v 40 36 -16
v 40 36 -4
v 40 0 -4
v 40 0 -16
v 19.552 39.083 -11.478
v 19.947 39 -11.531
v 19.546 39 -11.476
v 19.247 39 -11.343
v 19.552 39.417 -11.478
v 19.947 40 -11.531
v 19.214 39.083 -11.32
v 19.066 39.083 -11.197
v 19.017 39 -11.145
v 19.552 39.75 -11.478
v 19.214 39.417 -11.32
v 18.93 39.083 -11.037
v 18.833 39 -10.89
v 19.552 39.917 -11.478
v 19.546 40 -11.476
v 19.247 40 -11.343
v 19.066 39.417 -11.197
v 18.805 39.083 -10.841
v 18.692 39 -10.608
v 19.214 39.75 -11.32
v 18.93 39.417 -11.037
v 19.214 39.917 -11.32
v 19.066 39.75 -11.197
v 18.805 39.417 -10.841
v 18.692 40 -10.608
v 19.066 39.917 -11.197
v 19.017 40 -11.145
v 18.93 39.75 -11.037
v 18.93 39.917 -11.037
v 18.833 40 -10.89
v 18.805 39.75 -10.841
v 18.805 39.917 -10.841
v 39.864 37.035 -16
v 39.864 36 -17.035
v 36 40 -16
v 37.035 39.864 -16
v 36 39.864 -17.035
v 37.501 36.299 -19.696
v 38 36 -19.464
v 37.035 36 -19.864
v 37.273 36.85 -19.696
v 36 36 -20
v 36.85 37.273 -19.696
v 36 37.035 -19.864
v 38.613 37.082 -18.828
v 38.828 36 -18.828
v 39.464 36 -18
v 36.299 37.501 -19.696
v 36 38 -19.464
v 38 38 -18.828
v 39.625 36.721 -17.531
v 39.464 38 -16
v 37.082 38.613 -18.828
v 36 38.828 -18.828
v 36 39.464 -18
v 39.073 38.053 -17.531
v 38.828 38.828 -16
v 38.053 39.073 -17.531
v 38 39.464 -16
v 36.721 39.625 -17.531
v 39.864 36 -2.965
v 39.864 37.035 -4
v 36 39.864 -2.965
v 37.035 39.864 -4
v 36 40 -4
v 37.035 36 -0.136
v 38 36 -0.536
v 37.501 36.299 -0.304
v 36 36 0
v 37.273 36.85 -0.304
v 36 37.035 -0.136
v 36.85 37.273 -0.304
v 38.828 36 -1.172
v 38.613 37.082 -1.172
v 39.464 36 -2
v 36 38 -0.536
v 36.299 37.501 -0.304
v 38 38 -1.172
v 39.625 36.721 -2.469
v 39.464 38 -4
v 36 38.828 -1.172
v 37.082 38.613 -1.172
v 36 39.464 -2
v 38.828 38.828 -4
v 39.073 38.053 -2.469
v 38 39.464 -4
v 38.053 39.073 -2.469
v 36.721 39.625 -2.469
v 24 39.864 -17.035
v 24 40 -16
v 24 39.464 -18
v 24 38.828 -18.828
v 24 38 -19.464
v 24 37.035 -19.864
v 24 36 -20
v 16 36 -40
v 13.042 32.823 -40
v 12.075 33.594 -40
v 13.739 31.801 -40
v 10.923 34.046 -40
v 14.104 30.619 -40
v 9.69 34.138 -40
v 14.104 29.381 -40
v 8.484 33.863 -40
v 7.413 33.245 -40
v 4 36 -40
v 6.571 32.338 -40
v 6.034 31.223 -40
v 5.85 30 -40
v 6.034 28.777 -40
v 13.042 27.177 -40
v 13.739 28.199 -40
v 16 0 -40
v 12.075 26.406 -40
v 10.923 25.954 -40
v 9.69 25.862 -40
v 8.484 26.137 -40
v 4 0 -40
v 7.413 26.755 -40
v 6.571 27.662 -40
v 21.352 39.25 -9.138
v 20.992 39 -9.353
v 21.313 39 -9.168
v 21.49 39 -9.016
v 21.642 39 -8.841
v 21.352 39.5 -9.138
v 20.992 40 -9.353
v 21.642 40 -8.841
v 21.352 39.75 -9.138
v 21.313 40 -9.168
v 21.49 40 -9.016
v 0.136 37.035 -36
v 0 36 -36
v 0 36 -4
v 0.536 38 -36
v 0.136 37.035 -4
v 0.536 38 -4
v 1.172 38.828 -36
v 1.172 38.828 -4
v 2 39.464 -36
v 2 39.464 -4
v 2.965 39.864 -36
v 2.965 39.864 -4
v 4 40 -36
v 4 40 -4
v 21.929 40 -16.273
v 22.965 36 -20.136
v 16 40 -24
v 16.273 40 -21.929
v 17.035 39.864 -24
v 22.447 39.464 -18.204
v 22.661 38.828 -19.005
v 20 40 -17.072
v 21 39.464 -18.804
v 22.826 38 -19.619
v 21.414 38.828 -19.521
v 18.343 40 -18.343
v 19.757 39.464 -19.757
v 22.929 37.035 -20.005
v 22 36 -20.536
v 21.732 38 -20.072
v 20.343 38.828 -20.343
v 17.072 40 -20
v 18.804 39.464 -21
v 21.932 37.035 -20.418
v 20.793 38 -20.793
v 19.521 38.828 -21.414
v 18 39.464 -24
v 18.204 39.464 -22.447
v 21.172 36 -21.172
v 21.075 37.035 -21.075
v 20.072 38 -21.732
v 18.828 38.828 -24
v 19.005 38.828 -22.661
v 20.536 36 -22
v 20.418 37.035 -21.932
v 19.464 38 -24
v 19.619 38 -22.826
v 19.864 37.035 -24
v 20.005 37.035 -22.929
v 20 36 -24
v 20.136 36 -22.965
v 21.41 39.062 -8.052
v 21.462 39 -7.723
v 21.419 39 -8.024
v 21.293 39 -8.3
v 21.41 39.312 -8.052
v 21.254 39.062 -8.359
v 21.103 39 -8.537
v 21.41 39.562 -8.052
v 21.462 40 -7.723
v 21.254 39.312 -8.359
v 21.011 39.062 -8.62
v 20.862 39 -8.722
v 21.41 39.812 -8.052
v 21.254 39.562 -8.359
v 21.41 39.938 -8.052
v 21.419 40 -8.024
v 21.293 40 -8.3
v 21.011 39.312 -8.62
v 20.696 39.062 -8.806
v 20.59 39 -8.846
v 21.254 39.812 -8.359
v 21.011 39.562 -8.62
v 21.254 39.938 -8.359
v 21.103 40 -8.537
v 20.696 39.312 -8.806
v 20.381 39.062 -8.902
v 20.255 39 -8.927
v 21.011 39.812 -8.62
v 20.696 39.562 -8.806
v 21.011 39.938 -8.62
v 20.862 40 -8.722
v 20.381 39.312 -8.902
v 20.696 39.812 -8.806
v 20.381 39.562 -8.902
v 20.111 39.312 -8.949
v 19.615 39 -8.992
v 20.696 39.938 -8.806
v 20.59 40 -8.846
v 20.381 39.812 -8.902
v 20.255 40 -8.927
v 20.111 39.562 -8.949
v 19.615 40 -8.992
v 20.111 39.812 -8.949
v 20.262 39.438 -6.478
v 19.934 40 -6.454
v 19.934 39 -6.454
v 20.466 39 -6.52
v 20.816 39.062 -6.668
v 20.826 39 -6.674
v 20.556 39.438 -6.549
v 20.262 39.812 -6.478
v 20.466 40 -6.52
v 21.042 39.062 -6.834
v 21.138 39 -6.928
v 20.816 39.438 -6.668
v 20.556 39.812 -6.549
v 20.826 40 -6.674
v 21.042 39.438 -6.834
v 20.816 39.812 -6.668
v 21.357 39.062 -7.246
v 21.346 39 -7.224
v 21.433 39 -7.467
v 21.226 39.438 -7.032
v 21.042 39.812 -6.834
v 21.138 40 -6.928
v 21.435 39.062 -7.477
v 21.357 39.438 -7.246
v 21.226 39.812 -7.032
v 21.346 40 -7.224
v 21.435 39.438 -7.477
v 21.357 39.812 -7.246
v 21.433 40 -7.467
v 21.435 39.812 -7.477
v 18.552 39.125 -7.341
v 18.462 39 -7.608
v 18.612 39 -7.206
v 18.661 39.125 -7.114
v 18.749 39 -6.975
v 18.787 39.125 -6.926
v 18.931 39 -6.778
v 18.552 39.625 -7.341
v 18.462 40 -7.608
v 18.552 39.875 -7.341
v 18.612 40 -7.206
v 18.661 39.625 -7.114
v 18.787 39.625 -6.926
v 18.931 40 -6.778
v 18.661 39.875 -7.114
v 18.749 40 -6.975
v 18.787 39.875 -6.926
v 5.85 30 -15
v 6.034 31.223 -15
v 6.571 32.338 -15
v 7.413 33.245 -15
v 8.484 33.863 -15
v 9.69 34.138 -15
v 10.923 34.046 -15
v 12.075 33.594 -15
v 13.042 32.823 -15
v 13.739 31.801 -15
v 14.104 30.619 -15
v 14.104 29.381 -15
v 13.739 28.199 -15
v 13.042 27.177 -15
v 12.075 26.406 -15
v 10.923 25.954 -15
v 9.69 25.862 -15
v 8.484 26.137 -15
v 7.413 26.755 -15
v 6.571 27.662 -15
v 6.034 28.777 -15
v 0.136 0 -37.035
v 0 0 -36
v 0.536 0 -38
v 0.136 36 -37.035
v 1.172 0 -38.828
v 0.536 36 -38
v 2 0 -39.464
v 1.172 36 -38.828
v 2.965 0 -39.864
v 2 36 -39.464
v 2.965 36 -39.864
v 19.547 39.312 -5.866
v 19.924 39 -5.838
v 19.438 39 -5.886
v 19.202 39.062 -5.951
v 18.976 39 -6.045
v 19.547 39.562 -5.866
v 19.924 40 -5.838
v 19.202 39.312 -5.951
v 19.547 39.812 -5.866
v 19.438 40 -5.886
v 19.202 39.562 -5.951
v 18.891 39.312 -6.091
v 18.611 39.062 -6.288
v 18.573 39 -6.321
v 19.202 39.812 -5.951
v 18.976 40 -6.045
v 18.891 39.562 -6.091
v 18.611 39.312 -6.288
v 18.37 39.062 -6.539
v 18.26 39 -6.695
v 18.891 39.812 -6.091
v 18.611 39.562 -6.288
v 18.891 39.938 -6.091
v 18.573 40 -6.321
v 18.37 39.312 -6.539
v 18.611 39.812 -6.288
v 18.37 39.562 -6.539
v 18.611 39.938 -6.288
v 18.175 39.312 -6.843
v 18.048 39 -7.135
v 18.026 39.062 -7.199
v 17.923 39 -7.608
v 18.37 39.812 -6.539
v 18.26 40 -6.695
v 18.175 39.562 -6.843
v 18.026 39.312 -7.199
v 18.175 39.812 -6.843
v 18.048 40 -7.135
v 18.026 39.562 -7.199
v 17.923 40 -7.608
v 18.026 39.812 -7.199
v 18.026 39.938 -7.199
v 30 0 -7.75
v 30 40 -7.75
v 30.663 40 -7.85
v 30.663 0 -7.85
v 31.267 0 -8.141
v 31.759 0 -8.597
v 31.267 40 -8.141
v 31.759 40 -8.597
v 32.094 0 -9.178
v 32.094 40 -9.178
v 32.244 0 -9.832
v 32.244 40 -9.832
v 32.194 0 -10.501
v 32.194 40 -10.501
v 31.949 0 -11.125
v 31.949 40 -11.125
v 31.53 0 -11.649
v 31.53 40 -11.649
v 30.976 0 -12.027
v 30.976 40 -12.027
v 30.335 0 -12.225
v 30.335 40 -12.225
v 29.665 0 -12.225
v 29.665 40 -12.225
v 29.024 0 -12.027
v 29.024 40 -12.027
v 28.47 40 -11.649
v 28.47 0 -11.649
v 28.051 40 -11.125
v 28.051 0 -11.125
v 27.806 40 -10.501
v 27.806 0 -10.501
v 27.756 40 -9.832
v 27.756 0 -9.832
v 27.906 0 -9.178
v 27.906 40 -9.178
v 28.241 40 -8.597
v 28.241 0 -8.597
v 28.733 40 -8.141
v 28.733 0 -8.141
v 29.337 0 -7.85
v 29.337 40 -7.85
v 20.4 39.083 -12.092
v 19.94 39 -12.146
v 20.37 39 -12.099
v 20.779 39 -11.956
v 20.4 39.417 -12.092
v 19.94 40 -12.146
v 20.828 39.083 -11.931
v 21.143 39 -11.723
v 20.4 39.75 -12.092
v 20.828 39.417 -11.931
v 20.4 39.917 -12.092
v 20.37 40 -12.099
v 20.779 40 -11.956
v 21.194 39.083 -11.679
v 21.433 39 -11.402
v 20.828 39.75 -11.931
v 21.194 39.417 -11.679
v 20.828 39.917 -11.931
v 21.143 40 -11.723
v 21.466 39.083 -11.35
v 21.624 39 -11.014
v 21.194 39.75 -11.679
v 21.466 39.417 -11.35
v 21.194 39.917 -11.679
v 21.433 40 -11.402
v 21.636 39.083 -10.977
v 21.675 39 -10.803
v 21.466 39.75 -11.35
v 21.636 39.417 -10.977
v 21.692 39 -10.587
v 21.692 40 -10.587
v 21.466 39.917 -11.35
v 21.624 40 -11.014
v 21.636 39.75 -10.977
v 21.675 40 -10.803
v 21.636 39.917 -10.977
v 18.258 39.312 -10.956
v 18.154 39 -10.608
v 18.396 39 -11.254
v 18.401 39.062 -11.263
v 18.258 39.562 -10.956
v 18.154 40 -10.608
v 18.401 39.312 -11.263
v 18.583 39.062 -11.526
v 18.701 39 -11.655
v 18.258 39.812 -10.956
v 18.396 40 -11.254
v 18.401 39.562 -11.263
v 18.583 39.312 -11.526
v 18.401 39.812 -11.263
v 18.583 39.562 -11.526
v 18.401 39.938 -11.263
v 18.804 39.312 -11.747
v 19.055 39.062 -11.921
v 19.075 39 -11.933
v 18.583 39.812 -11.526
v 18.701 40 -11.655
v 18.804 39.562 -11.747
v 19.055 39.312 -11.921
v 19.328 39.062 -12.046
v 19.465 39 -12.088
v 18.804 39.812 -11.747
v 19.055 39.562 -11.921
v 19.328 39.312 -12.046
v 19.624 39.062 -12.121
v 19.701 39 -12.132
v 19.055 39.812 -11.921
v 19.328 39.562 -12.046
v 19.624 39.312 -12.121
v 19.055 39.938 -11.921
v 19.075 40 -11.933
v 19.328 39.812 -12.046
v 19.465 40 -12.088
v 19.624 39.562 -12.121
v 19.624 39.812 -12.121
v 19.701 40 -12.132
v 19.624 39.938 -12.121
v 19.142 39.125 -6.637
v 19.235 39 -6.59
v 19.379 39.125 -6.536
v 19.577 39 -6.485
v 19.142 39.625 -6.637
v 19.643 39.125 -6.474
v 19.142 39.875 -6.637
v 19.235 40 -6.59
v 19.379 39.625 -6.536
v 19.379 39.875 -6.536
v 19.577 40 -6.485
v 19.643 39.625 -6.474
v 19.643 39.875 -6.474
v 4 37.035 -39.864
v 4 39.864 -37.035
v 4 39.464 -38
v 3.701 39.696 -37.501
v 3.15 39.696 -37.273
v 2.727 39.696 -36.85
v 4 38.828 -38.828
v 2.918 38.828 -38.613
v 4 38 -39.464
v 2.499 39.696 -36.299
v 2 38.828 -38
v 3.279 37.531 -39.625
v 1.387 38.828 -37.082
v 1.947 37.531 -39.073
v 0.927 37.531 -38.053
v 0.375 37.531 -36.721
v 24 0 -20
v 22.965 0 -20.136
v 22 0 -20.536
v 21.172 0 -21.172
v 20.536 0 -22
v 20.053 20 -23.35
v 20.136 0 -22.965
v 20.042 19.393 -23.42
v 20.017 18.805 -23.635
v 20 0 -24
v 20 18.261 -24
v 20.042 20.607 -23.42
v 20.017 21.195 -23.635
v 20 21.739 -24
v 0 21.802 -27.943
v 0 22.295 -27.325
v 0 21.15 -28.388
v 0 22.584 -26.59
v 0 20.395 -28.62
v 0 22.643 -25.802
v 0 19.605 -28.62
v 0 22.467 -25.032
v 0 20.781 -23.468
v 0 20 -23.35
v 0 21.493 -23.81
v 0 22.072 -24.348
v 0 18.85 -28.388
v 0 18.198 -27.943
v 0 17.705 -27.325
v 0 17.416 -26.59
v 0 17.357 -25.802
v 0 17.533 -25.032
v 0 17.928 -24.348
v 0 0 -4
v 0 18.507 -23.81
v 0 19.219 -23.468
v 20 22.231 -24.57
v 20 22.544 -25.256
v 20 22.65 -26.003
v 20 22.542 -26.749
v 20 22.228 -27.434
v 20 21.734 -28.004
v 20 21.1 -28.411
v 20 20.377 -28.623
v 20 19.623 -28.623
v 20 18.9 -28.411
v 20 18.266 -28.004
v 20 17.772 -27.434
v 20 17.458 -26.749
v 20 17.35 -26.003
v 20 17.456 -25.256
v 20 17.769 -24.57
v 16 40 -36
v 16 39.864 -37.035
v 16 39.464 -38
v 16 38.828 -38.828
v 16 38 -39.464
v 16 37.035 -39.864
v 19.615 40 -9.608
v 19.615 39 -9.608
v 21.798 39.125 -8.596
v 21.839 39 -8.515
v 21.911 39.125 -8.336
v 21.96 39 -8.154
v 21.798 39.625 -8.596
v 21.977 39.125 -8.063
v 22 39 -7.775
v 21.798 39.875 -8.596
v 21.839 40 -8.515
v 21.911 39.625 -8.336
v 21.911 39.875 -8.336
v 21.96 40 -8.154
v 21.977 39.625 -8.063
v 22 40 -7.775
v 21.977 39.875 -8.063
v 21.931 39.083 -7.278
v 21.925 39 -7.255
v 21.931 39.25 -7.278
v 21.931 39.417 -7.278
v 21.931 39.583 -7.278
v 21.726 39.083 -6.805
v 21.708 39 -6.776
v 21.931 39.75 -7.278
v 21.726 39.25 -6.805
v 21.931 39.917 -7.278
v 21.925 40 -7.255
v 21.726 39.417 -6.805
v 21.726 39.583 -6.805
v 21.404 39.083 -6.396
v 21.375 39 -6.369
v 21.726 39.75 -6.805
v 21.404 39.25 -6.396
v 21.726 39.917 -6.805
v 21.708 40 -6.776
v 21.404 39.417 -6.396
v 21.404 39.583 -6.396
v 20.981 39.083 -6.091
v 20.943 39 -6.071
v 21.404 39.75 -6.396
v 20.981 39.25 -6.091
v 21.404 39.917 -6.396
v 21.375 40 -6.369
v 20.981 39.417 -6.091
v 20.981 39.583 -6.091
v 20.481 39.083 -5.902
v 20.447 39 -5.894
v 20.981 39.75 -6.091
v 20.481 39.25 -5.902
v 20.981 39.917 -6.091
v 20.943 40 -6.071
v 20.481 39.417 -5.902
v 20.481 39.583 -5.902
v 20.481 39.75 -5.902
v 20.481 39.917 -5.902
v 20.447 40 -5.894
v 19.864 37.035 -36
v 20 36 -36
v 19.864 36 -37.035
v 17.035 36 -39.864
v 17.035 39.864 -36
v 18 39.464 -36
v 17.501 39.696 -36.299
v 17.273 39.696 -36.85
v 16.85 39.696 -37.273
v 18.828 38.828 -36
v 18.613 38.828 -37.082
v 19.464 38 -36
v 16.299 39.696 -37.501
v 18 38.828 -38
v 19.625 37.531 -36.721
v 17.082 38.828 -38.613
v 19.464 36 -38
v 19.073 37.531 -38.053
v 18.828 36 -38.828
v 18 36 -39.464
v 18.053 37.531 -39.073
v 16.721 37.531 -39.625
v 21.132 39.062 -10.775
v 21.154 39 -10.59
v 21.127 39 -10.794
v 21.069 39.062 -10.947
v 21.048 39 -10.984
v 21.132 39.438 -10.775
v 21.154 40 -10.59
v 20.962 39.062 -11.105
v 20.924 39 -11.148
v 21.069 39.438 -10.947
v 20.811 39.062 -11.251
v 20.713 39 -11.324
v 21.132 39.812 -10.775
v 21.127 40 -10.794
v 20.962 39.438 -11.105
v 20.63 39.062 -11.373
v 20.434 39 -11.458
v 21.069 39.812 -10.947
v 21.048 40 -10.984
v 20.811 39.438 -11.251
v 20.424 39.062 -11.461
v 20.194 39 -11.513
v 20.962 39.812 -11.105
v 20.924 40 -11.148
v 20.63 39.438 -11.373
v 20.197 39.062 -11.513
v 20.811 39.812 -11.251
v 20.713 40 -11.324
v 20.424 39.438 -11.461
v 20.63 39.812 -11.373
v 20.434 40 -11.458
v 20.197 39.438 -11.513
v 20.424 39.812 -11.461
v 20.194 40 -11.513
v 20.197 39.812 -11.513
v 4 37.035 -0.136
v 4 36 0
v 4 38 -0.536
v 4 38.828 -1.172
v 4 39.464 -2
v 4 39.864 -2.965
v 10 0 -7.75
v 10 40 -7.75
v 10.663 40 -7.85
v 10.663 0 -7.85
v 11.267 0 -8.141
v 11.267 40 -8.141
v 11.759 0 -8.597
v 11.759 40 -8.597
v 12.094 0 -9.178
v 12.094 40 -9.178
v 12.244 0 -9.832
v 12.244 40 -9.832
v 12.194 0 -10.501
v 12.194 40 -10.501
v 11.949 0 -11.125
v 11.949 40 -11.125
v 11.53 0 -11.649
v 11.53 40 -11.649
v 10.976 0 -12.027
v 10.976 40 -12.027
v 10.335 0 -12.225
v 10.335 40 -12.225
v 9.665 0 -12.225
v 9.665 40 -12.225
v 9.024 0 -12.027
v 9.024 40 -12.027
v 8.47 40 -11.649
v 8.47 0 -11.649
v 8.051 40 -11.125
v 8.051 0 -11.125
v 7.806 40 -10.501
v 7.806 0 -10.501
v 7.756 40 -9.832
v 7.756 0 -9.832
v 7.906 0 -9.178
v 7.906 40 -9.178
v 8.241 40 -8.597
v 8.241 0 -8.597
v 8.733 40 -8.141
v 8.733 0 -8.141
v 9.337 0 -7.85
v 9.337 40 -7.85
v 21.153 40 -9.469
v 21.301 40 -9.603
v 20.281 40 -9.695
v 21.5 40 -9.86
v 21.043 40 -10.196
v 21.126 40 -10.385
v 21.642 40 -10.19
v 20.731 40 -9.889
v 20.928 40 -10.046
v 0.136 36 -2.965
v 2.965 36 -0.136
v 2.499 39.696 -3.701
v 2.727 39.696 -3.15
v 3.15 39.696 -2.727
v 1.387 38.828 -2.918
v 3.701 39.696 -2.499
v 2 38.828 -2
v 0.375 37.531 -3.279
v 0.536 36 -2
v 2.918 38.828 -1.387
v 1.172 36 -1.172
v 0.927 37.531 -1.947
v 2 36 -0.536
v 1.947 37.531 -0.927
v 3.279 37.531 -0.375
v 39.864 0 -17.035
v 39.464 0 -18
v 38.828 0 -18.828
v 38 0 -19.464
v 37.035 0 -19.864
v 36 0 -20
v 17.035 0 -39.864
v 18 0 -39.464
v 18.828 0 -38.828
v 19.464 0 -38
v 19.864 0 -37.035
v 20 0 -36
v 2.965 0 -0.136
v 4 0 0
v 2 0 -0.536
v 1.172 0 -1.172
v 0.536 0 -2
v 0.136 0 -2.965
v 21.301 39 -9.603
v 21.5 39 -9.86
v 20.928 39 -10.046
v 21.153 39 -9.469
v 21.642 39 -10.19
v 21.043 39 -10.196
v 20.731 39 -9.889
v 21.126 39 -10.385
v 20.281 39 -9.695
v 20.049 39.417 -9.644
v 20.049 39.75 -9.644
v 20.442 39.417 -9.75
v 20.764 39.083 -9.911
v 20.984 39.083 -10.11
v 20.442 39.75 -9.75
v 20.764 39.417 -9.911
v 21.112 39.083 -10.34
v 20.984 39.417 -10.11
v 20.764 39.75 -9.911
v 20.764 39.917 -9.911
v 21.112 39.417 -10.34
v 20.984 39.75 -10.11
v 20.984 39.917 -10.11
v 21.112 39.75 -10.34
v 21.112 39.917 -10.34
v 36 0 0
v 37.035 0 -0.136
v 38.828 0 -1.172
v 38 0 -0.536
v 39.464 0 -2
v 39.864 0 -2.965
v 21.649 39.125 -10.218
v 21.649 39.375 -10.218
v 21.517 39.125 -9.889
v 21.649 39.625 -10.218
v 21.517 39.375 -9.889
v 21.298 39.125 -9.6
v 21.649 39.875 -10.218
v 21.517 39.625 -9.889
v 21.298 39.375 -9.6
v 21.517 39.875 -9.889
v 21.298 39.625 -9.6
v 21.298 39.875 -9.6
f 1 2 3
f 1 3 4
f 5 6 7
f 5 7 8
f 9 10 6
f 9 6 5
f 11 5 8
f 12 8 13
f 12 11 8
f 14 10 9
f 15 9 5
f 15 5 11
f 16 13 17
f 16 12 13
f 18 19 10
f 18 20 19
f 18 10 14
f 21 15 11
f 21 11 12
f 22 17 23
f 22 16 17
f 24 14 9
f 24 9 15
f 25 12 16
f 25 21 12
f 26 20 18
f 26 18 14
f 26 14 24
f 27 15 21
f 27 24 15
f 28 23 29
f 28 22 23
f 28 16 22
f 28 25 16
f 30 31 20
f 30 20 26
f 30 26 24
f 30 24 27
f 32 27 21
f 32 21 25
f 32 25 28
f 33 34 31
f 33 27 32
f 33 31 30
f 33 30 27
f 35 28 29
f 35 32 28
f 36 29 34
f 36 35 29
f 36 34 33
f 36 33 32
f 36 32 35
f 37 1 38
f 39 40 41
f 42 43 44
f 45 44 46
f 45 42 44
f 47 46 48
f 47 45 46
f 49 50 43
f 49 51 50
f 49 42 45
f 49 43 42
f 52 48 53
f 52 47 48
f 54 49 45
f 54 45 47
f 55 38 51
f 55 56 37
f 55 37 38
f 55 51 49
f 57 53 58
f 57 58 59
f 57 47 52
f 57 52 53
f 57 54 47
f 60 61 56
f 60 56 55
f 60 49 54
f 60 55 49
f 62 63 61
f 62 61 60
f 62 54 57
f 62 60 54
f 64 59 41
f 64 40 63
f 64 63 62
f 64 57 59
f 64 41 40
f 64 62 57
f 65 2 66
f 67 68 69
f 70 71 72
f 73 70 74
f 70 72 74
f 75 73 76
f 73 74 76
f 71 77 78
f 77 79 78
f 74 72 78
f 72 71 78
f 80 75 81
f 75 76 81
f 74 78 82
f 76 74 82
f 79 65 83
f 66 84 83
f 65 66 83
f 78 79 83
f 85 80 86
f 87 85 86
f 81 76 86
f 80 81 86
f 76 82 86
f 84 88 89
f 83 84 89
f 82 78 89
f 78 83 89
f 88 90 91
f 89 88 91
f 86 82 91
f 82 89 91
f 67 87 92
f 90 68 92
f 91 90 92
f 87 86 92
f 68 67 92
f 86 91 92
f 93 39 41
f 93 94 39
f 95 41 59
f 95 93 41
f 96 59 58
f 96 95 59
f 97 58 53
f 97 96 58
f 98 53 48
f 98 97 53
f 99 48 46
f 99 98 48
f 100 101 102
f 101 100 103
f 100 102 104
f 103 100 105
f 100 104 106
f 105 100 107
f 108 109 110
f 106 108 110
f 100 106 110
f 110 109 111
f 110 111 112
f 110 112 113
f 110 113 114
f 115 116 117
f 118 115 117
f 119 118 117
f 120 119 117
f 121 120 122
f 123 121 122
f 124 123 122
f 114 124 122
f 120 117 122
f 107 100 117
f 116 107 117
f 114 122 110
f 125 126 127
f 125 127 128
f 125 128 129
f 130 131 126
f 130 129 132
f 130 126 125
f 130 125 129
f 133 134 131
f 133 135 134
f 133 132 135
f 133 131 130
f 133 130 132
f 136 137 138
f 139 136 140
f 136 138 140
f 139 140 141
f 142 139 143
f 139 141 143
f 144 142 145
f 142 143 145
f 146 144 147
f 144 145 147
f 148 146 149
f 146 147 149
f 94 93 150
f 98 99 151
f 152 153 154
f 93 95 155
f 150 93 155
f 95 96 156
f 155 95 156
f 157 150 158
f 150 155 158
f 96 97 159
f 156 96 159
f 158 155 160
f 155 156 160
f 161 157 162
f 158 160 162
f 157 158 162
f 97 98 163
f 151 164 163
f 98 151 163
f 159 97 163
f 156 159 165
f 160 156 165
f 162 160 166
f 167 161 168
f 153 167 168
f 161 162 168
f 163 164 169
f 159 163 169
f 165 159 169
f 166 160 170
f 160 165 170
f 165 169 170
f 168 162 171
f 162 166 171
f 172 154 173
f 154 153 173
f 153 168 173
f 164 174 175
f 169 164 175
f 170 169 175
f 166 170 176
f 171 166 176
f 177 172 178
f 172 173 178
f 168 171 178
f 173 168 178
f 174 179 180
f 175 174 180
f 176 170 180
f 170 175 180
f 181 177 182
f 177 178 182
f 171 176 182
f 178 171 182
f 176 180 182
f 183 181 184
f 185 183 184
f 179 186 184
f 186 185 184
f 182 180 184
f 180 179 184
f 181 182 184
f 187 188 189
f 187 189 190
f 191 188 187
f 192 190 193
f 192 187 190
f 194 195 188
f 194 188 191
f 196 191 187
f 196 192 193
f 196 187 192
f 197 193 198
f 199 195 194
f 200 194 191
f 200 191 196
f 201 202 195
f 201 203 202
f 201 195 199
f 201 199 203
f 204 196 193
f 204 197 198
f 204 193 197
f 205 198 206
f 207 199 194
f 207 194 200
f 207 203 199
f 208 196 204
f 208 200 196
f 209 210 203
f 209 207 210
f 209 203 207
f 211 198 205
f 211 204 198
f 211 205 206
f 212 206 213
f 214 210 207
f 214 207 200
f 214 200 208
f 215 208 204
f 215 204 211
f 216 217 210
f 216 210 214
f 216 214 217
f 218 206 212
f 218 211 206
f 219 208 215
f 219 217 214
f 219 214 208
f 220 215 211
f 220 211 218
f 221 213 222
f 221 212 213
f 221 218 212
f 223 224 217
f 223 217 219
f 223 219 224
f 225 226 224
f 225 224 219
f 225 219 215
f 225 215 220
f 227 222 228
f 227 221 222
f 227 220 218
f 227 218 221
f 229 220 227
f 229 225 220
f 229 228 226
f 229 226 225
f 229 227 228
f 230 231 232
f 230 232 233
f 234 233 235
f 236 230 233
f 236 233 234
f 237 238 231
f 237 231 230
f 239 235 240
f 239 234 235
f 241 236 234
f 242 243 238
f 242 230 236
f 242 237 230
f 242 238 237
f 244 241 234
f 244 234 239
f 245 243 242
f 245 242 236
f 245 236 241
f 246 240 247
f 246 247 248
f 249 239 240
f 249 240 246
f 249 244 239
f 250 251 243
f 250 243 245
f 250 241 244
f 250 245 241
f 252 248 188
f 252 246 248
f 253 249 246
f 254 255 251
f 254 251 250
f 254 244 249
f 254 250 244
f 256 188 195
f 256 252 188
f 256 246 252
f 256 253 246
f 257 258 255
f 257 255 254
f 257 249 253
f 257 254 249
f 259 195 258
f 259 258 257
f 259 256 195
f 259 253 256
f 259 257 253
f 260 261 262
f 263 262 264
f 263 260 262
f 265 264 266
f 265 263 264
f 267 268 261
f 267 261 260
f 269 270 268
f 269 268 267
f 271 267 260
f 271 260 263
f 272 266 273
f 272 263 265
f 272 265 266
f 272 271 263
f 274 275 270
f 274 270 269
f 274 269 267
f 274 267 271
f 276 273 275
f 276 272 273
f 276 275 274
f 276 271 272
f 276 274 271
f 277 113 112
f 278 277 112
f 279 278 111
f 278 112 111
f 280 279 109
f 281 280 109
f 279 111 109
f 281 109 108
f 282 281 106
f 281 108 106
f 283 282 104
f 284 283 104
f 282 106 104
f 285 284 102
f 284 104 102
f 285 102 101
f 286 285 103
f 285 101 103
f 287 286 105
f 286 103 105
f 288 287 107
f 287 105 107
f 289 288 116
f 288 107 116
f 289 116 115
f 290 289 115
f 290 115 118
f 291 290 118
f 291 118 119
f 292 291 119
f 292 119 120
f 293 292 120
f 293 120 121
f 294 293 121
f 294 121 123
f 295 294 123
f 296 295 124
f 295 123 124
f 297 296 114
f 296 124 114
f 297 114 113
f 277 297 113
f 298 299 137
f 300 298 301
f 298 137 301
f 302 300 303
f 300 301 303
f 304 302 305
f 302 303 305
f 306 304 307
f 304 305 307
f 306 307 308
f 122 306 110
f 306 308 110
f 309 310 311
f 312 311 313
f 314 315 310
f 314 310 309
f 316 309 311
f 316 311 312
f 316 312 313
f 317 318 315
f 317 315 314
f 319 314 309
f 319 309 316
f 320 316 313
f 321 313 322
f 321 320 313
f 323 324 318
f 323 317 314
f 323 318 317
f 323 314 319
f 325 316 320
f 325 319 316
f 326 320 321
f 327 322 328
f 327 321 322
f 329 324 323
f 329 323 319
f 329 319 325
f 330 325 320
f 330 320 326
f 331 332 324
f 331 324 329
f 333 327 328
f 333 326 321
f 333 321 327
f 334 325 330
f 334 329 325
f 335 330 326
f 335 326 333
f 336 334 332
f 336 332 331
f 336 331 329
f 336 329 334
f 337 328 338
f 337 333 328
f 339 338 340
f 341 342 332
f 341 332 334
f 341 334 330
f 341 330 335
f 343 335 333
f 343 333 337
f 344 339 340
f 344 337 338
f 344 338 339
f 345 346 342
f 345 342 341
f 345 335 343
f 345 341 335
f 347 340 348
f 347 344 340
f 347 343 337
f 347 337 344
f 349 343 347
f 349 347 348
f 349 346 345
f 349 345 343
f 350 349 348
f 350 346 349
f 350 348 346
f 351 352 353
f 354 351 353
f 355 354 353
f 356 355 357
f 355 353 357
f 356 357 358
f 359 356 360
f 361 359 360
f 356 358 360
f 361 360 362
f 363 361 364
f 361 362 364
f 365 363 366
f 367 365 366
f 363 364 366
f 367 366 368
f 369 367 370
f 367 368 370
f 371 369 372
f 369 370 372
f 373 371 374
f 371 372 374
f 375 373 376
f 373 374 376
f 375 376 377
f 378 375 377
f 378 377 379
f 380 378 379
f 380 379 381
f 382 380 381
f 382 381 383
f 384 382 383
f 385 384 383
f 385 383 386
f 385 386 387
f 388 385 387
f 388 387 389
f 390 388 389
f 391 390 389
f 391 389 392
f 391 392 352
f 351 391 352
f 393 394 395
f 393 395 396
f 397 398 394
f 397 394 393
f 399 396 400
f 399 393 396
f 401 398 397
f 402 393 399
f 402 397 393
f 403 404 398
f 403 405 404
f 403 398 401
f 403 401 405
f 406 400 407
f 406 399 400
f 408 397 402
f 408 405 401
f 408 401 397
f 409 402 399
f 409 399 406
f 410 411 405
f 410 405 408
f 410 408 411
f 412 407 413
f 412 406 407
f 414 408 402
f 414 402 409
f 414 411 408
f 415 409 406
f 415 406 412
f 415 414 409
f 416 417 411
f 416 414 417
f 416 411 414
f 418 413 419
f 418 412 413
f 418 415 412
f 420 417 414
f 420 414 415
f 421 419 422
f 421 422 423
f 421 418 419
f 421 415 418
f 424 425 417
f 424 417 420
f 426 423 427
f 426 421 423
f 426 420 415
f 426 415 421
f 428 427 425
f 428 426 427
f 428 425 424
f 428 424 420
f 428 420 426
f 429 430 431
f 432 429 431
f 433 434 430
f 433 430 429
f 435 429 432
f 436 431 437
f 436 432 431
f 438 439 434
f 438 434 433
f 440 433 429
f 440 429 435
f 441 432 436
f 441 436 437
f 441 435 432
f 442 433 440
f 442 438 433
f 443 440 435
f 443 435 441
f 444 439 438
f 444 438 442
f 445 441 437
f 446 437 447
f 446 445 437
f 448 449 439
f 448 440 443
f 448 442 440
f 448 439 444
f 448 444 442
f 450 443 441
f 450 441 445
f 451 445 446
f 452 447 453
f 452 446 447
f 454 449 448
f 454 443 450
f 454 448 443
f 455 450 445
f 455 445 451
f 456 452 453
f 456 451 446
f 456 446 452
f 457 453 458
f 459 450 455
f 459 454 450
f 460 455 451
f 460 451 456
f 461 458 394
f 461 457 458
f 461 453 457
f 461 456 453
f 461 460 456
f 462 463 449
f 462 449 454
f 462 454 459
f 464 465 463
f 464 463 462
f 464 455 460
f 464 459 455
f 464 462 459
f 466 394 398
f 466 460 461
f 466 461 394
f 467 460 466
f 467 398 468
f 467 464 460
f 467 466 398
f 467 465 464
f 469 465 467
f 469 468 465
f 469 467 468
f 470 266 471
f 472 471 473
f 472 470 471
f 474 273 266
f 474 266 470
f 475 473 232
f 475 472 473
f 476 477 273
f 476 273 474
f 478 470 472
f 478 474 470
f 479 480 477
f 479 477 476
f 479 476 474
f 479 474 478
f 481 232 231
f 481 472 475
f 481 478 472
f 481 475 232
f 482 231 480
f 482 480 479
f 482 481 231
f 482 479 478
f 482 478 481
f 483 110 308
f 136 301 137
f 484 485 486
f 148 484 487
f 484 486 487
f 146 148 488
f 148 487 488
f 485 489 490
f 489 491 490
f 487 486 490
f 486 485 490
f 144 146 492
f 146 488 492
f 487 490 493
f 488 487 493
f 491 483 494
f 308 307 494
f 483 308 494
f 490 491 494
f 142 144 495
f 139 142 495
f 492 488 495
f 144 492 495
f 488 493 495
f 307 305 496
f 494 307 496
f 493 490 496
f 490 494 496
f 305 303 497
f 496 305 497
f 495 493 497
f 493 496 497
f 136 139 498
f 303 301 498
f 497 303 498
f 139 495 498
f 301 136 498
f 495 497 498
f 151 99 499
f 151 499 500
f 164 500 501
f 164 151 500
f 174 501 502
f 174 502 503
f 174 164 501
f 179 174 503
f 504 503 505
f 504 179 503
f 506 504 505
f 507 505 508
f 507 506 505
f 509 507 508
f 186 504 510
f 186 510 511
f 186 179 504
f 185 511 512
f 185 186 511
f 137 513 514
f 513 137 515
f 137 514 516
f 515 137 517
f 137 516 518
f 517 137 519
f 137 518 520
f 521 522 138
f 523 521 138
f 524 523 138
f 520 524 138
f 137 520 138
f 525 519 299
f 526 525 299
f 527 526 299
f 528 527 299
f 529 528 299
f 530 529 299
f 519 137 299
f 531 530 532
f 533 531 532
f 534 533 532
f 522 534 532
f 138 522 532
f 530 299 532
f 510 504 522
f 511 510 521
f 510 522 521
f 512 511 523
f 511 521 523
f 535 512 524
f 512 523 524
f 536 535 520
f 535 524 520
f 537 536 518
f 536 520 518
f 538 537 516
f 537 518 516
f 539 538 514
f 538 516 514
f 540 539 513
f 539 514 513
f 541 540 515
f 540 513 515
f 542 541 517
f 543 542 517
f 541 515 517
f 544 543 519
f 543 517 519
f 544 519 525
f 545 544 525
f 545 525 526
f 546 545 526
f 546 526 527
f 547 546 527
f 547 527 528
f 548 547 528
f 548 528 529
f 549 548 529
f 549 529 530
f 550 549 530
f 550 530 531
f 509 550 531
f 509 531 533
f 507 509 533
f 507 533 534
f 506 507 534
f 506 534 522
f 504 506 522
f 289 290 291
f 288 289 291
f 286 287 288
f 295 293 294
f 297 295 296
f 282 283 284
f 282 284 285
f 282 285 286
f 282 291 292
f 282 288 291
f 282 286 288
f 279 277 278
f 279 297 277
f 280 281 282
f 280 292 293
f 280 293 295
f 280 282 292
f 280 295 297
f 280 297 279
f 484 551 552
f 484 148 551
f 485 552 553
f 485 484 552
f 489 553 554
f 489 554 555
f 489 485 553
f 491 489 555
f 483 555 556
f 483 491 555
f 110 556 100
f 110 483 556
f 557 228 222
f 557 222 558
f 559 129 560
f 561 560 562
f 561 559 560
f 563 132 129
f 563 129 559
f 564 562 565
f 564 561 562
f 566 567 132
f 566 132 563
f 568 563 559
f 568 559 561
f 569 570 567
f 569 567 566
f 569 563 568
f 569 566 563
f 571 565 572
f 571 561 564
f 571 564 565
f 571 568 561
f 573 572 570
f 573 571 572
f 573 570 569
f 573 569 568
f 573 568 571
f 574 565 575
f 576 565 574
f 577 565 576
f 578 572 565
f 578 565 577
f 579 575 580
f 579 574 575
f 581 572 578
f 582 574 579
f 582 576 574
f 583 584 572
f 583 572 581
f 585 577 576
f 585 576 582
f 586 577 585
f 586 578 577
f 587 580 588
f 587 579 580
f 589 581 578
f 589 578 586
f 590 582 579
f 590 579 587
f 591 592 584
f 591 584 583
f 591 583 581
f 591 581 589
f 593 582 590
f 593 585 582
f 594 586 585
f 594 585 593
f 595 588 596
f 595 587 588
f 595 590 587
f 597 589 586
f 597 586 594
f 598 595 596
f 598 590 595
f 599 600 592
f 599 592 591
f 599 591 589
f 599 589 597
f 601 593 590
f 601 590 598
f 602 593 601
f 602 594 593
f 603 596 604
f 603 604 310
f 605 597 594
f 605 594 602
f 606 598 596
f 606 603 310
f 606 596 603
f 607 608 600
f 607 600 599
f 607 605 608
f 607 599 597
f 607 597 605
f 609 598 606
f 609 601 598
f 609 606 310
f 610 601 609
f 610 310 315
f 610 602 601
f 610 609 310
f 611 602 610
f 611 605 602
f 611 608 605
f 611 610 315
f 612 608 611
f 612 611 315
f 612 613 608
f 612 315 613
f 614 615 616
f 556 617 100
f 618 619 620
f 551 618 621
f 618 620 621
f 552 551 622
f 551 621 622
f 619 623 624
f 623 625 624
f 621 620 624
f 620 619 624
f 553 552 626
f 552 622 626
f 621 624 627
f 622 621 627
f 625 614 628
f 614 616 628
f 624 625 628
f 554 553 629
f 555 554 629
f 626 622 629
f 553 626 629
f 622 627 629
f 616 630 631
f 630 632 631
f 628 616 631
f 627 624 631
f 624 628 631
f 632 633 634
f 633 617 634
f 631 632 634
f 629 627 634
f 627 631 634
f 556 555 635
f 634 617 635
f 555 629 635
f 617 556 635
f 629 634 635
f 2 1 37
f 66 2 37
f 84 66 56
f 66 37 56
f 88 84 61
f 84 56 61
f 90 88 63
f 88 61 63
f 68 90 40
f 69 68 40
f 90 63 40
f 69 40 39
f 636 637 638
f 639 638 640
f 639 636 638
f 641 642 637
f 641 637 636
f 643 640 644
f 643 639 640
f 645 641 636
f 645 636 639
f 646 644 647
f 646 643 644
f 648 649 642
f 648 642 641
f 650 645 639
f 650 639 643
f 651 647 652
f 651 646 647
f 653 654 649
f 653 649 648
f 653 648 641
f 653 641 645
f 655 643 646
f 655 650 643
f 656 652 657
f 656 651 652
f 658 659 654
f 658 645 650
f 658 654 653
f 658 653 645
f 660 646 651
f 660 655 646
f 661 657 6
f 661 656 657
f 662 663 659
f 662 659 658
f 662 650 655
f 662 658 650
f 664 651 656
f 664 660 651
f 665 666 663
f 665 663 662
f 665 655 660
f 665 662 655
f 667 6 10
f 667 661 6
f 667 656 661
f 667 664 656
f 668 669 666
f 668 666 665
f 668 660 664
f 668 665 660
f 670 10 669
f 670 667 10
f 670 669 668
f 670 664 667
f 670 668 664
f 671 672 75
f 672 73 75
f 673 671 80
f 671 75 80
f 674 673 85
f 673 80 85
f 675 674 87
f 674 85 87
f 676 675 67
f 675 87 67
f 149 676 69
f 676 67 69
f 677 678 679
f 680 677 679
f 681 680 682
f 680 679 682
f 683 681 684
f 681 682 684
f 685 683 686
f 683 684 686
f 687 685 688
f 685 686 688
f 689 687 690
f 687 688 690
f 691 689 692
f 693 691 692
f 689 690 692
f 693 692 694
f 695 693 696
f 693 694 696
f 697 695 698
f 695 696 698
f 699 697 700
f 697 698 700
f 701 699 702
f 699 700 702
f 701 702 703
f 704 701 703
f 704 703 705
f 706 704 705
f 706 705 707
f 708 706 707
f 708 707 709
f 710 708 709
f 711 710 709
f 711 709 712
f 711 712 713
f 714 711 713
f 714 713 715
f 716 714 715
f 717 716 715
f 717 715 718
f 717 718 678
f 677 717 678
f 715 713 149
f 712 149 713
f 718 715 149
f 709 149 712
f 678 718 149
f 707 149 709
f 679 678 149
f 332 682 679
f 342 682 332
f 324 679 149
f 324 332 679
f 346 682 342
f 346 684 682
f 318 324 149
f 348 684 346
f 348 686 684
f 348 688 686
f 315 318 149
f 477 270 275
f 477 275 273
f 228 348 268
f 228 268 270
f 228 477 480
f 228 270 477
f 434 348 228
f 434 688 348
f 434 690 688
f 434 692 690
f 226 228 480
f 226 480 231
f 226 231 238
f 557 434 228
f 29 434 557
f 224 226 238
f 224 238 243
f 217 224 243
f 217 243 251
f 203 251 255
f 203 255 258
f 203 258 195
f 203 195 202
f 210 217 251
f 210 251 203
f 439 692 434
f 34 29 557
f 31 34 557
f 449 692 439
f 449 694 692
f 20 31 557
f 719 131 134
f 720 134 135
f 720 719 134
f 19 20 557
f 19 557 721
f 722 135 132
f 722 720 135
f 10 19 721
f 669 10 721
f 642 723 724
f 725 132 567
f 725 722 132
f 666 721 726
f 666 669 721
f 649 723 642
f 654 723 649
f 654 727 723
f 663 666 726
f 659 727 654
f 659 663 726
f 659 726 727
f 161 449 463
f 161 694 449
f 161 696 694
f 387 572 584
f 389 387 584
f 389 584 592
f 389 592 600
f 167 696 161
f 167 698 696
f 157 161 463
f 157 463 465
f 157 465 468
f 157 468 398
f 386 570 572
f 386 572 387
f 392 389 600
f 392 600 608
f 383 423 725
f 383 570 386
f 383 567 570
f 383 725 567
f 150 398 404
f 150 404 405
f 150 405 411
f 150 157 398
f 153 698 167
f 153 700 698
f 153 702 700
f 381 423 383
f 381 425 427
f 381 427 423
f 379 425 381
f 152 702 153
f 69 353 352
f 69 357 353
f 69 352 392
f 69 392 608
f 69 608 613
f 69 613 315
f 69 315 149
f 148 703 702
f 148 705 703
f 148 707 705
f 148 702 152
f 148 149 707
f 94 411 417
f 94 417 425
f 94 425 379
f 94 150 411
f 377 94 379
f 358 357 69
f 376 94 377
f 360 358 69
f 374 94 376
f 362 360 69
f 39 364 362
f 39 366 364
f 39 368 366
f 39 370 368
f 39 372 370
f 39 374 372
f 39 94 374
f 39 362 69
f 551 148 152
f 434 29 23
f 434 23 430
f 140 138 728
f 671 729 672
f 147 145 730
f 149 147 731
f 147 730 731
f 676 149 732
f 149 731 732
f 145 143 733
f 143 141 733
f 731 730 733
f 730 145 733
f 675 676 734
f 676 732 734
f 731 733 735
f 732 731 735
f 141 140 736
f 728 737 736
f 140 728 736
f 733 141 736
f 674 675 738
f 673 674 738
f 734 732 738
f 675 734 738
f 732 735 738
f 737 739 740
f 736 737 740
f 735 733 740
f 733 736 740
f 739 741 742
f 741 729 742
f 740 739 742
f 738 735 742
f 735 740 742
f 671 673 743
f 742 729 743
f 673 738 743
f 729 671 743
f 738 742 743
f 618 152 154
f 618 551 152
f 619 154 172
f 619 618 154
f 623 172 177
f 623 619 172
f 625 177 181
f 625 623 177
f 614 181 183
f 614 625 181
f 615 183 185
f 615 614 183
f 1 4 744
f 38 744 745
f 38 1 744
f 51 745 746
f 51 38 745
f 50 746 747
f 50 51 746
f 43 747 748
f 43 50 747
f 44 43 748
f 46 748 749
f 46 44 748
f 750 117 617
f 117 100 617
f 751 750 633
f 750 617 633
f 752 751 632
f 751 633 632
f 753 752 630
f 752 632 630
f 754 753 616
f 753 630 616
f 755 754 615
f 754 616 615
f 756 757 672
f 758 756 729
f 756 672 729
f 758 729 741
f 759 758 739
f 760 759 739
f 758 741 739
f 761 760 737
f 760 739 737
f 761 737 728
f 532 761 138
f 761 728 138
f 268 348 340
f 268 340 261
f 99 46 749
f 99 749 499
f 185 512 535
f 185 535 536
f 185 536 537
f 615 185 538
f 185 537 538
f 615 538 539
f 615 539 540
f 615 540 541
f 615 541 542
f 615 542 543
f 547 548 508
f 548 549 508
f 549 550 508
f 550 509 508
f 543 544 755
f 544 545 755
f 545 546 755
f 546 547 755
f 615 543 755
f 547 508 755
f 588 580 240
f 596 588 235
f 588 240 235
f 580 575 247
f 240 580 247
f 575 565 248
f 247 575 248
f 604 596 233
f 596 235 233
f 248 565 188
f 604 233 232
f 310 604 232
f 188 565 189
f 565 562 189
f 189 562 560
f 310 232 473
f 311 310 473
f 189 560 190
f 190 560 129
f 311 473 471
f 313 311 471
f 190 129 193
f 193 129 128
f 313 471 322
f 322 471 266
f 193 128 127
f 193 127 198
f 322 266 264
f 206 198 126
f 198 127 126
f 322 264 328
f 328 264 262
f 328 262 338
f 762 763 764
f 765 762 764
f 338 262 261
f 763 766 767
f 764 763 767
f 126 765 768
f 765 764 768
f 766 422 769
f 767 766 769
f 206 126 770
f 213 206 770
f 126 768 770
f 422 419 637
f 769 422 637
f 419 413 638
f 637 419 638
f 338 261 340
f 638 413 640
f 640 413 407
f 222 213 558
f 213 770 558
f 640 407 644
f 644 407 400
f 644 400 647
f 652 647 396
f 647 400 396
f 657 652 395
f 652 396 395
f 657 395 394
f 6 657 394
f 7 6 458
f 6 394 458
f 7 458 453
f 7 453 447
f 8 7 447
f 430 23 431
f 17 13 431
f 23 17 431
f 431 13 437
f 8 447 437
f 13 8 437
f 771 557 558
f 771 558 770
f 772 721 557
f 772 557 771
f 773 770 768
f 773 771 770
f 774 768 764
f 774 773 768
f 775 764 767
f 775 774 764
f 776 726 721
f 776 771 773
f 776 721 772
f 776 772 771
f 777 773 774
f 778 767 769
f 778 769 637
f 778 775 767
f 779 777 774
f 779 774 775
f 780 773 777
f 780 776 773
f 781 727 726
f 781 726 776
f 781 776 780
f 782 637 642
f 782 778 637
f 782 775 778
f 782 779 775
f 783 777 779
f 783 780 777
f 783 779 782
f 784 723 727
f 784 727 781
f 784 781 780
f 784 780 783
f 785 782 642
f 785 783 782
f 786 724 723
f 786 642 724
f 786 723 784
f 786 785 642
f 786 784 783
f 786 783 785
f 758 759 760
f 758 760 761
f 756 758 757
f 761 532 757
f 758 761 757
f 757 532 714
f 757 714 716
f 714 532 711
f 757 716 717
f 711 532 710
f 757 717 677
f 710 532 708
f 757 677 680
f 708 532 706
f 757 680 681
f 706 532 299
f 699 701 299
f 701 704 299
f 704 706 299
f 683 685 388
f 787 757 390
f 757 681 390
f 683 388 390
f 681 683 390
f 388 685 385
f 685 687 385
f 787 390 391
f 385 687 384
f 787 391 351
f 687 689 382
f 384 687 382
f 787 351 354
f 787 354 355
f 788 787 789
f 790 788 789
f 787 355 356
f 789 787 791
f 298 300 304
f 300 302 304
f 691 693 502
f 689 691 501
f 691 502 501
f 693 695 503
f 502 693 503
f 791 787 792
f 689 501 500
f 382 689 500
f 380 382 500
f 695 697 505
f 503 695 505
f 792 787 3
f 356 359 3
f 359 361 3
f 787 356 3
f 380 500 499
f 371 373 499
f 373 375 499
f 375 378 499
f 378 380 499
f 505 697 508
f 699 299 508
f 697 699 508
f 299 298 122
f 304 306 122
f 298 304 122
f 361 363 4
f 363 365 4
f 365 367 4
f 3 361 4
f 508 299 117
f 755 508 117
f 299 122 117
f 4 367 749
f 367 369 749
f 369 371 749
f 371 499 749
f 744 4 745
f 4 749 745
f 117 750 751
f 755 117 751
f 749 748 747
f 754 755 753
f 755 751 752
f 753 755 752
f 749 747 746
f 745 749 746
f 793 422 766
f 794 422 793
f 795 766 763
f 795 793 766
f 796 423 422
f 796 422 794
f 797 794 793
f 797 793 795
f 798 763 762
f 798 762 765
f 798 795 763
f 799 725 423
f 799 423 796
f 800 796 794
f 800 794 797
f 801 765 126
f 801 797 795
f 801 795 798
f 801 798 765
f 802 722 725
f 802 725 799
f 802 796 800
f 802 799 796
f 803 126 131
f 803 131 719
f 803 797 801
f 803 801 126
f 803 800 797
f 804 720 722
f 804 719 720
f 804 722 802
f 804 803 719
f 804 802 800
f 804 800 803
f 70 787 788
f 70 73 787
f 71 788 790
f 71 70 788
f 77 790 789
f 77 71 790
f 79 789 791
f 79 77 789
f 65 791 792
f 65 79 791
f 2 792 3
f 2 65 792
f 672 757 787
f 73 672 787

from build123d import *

# Parameters (mm, degrees)
SALIENTE_EXTRUIR1_DEPTH = 40
CORTAR_EXTRUIR1_REACH   = 71.282
CROQUIS2_R              = 2.25
REDONDEO3_R             = 4
CROQUIS3_R              = 4.15
CORTAR_EXTRUIR3_DEPTH   = 25
CORTAR_EXTRUIR5_DEPTH   = 1
CROQUIS7_R              = 2.65
CORTAR_EXTRUIR6_DEPTH   = 70.28203236


with BuildPart() as part:
    # Croquis1 → Saliente-Extruir1 (new body)
    with BuildSketch(Plane(origin=(0, 0, 0), x_dir=(1, 0, 0), z_dir=(0, 1, 0))):
        Polygon((0, 0), (40, 0), (40, 20), (20, 20), (20, 40), (0, 40), align=None)
    extrude(amount=SALIENTE_EXTRUIR1_DEPTH)

    # Croquis2 → Cortar-Extruir1 (cut, up to next)
    with BuildSketch(Plane(origin=(0, 40, 0), x_dir=(1, 0, 0), z_dir=(0, 1, 0)), mode=Mode.PRIVATE) as cortar_extruir1_sk1:
        with Locations(Location((30, 10, 0), (0, 0, 270))):
            Circle(CROQUIS2_R)
    cortar_extruir1_tool1 = extrude(cortar_extruir1_sk1.sketch, amount=-CORTAR_EXTRUIR1_REACH, mode=Mode.PRIVATE) & part.part
    # Croquis2 → Cortar-Extruir1 (cut, up to next)
    with BuildSketch(Plane(origin=(0, 40, 0), x_dir=(1, 0, 0), z_dir=(0, 1, 0)), mode=Mode.PRIVATE) as cortar_extruir1_sk2:
        with Locations(Location((10, 10, 0), (0, 0, 270))):
            Circle(CROQUIS2_R)
    cortar_extruir1_tool2 = extrude(cortar_extruir1_sk2.sketch, amount=-CORTAR_EXTRUIR1_REACH, mode=Mode.PRIVATE) & part.part
    add(cortar_extruir1_tool1.solids().sort_by_distance((30, 40, -10))[0], mode=Mode.SUBTRACT)
    add(cortar_extruir1_tool2.solids().sort_by_distance((10, 40, -10))[0], mode=Mode.SUBTRACT)

    # Redondeo3
    redondeo3_edges = [part.edges().sort_by_distance(p)[0] for p in [
        (40, 40, -10),
        (0, 20, -40),
        (20, 20, -40),
        (20, 20, -20),
        (40, 20, -20),
        (40, 20, 0),
        (0, 20, 0),
        (30, 40, -20),
        (20, 40, -30),
        (10, 40, -40),
        (0, 40, -20),
        (20, 40, 0),
    ]]
    fillet(redondeo3_edges, radius=REDONDEO3_R)

    # Croquis3 → Cortar-Extruir3 (cut)
    with BuildSketch(Plane(origin=(0, 0, -40), x_dir=(-1, 0, 0), z_dir=(0, 0, -1))):
        with Locations((-10, 30)):
            Circle(CROQUIS3_R)
    extrude(amount=-CORTAR_EXTRUIR3_DEPTH, mode=Mode.SUBTRACT)

    # Croquis6 → Cortar-Extruir5 (cut)
    with BuildSketch(Plane(origin=(0, 40, 0), x_dir=(1, 0, 0), z_dir=(0, 1, 0))):
        with BuildLine():
            Line((18.692307692, 10.607697294), (18.153846154, 10.607697294))
            add(Edge.make_bspline(
                [(18.153846154, 10.607697294), (18.168433955, 10.668095838), (18.196951913, 10.786170051), (18.256433468, 10.954868213), (18.321232191, 11.114508535), (18.399042084, 11.262101804), (18.483914234, 11.400614209), (18.581153186, 11.526904137), (18.68627271, 11.644183506), (18.802544052, 11.748263342), (18.9244789, 11.842510878), (19.053795391, 11.922868119), (19.18789178, 11.991995238), (19.327697151, 12.048944207), (19.473627731, 12.091845105), (19.624364228, 12.122971057), (19.780301657, 12.143184396), (19.88615467, 12.145157132), (19.939903846, 12.146158832)],
                knots=[0, 0, 0, 0, 1.162005537, 2.271625781, 3.343758855, 4.383309926, 5.390229558, 6.379919256, 7.361854164, 8.333198761, 9.295911338, 10.242430842, 11.177959212, 12.116337295, 13.062827104, 14.020064771, 14.994644689, 16, 16, 16, 16], degree=3))
            add(Edge.make_bspline(
                [(19.939903846, 12.146158832), (20.018217118, 12.143794438), (20.173135423, 12.139117223), (20.400729218, 12.09640676), (20.620203765, 12.028820819), (20.829156761, 11.935437287), (21.023245502, 11.820259036), (21.195936108, 11.683176629), (21.344887841, 11.52683497), (21.469849631, 11.354150574), (21.567692487, 11.169598272), (21.639840556, 10.979655145), (21.683763437, 10.784771766), (21.689455821, 10.653187859), (21.692307692, 10.587264602)],
                knots=[0, 0, 0, 0, 1.083050992, 2.142477498, 3.193116406, 4.255571735, 5.30263384, 6.308962982, 7.297363603, 8.282367274, 9.249857812, 10.179914175, 11.08814088, 12, 12, 12, 12], degree=3))
            add(Edge.make_bspline(
                [(21.692307692, 10.587264602), (21.690312965, 10.523824382), (21.686409593, 10.399681717), (21.653266097, 10.218444865), (21.597489647, 10.047630693), (21.520227197, 9.88652013), (21.42021311, 9.73613469), (21.299059916, 9.59613602), (21.155912496, 9.465903177), (21.047434316, 9.391298367), (20.991586538, 9.352889602)],
                knots=[0, 0, 0, 0, 1.024540389, 2.004866551, 2.965041327, 3.920577974, 4.882998113, 5.874504559, 6.905732034, 8, 8, 8, 8], degree=3))
            add(Edge.make_bspline(
                [(20.991586538, 9.352889602), (21.055412403, 9.322069879), (21.181869902, 9.261007095), (21.354242239, 9.141254367), (21.510718596, 9.002986343), (21.597982115, 8.895084653), (21.641826923, 8.840870371)],
                knots=[0, 0, 0, 0, 1.015518401, 2.012035669, 3.001164323, 4, 4, 4, 4], degree=3))
            add(Edge.make_bspline(
                [(21.641826923, 8.840870371), (21.670697796, 8.801342797), (21.72796676, 8.72293494), (21.798656247, 8.596872495), (21.862786157, 8.469412799), (21.912757962, 8.337139532), (21.951456019, 8.201585794), (21.979117789, 8.06251883), (21.99630203, 7.919825077), (21.998762976, 7.823289396), (22, 7.774764602)],
                knots=[0, 0, 0, 0, 1.025084078, 2.033381695, 3.024893161, 4.013698104, 4.991890475, 5.976764909, 6.982997093, 8, 8, 8, 8], degree=3))
            add(Edge.make_bspline(
                [(22, 7.774764602), (21.996923691, 7.690747937), (21.99078555, 7.523109991), (21.935921423, 7.275439039), (21.850870153, 7.033338178), (21.730086835, 6.801781311), (21.582885391, 6.585129229), (21.407758549, 6.391284128), (21.206696135, 6.224657949), (20.98245788, 6.085440416), (20.739514231, 5.974152549), (20.479670359, 5.896911218), (20.206670266, 5.84660379), (20.019457756, 5.841209158), (19.924278846, 5.838466525)],
                knots=[0, 0, 0, 0, 0.955779014, 1.907060117, 2.875433937, 3.871313158, 4.872415639, 5.851225146, 6.836215519, 7.83643374, 8.849228613, 9.86973379, 10.916971861, 12, 12, 12, 12], degree=3))
            add(Edge.make_bspline(
                [(19.924278846, 5.838466525), (19.860131474, 5.83995489), (19.733910837, 5.842883498), (19.548350554, 5.862903957), (19.371227641, 5.89946968), (19.202302616, 5.948675346), (19.041425411, 6.01106119), (18.889086945, 6.088750387), (18.744349984, 6.180141533), (18.608580354, 6.286313398), (18.481794238, 6.405081409), (18.367360996, 6.538553997), (18.26337278, 6.684263833), (18.172613971, 6.843903357), (18.090950623, 7.015409513), (18.023783269, 7.200978367), (17.964665151, 7.398950976), (17.937179213, 7.536912817), (17.923076923, 7.607697294)],
                knots=[0, 0, 0, 0, 1.048658725, 2.063410685, 3.046034179, 4.001477787, 4.936774919, 5.862367409, 6.792675028, 7.730719943, 8.675894397, 9.627829632, 10.600096036, 11.597688215, 12.626045268, 13.701542398, 14.82072376, 16, 16, 16, 16], degree=3))
            Line((17.923076923, 7.607697294), (18.461538462, 7.607697294))
            add(Edge.make_bspline(
                [(18.461538462, 7.607697294), (18.475566961, 7.561498986), (18.502853611, 7.471639263), (18.549300979, 7.342313024), (18.602218017, 7.223756362), (18.658985832, 7.115099581), (18.718606025, 7.015272606), (18.785317326, 6.926915116), (18.854178717, 6.846146198), (18.90608618, 6.800641149), (18.931490385, 6.778370371)],
                knots=[0, 0, 0, 0, 1.198163088, 2.33053128, 3.407730985, 4.417276592, 5.372219308, 6.28897303, 7.162600585, 8, 8, 8, 8], degree=3))
            add(Edge.make_bspline(
                [(18.931490385, 6.778370371), (18.965084516, 6.75247037), (19.032169081, 6.700750315), (19.141486048, 6.634747524), (19.256454424, 6.577557195), (19.379565295, 6.533870859), (19.508162044, 6.496880583), (19.644323241, 6.472673979), (19.786847614, 6.456065685), (19.88416378, 6.454600089), (19.933894231, 6.45385114)],
                knots=[0, 0, 0, 0, 0.946170439, 1.889420265, 2.845303464, 3.807233317, 4.801018734, 5.828864929, 6.890507805, 8, 8, 8, 8], degree=3))
            add(Edge.make_bspline(
                [(19.933894231, 6.45385114), (19.990043092, 6.454906978), (20.099837344, 6.456971577), (20.260045675, 6.475958503), (20.412458442, 6.50361064), (20.555383457, 6.546318611), (20.690692899, 6.599085785), (20.816490012, 6.665340194), (20.934426194, 6.743074003), (21.042990889, 6.831426846), (21.140611759, 6.928149409), (21.226565211, 7.029314674), (21.299636059, 7.134496096), (21.358579336, 7.244275732), (21.405123136, 7.358198981), (21.436808623, 7.476585546), (21.458839792, 7.598466574), (21.460633984, 7.681316235), (21.461538462, 7.723081909)],
                knots=[0, 0, 0, 0, 1.217147791, 2.380027433, 3.494444702, 4.572153297, 5.609568379, 6.639424714, 7.649109417, 8.668170816, 9.669597737, 10.625200337, 11.543417969, 12.441394052, 13.322311151, 14.205496177, 15.095365482, 16, 16, 16, 16], degree=3))
            add(Edge.make_bspline(
                [(21.461538462, 7.723081909), (21.458915087, 7.778987062), (21.453681393, 7.89051919), (21.413723828, 8.05460646), (21.348000061, 8.212703739), (21.255990042, 8.362113665), (21.143985935, 8.500586639), (21.013074666, 8.624137752), (20.862169132, 8.726086479), (20.723277928, 8.796524176), (20.600251945, 8.844587733), (20.494968429, 8.876601958), (20.377099966, 8.903711082), (20.24807194, 8.928932119), (20.10691214, 8.950397287), (19.953774246, 8.968297543), (19.788627227, 8.98262047), (19.674299514, 8.989016633), (19.615384615, 8.992312679)],
                knots=[0, 0, 0, 0, 1.07054697, 2.135767047, 3.216561865, 4.33974944, 5.486079747, 6.621378074, 7.775625952, 8.963672916, 9.598146892, 10.304877434, 11.070270905, 11.915000392, 12.823868403, 13.805723172, 14.86925407, 16, 16, 16, 16], degree=3))
            Line((19.615384615, 8.992312679), (19.615384615, 9.607697294))
            add(Edge.make_bspline(
                [(19.615384615, 9.607697294), (19.689615185, 9.608956958), (19.835014636, 9.611424329), (20.047404873, 9.641266632), (20.25050198, 9.682547709), (20.439804966, 9.745779467), (20.612345617, 9.819219976), (20.762036364, 9.904680907), (20.886780045, 9.99967762), (20.985970453, 10.105676379), (21.060591988, 10.219359317), (21.115152212, 10.337845016), (21.147381343, 10.462171978), (21.151683629, 10.54701998), (21.153846154, 10.589668448)],
                knots=[0, 0, 0, 0, 1.321986639, 2.589447074, 3.816329219, 5.01088745, 6.139805852, 7.153945165, 8.075214402, 8.924034688, 9.728124013, 10.488707548, 11.240355623, 12, 12, 12, 12], degree=3))
            add(Edge.make_bspline(
                [(21.153846154, 10.589668448), (21.153135735, 10.621001725), (21.151722391, 10.683337795), (21.133898486, 10.774409341), (21.107114416, 10.862696677), (21.070292022, 10.947824351), (21.021005968, 11.029201964), (20.962024276, 11.107523305), (20.891793247, 11.182341212), (20.811315338, 11.252078902), (20.724895101, 11.318540452), (20.630181201, 11.37496383), (20.530029416, 11.423212507), (20.424328865, 11.463000225), (20.312736527, 11.492930434), (20.195776714, 11.514420447), (20.073226399, 11.527856427), (19.989617716, 11.529790854), (19.947115385, 11.530774217)],
                knots=[0, 0, 0, 0, 0.884392785, 1.759457502, 2.611959086, 3.489218968, 4.37281399, 5.2945488, 6.255912374, 7.266815255, 8.301784654, 9.332968512, 10.37626691, 11.440494194, 12.520033166, 13.637162961, 14.798855837, 16, 16, 16, 16], degree=3))
            add(Edge.make_bspline(
                [(19.947115385, 11.530774217), (19.878798239, 11.528389025), (19.745358966, 11.52373019), (19.552990537, 11.482925024), (19.374157393, 11.417819738), (19.237462536, 11.340105991), (19.13652098, 11.263390961), (19.064389086, 11.196392585), (18.993553925, 11.121936316), (18.928675622, 11.035436244), (18.863063091, 10.942750318), (18.803329557, 10.839166864), (18.74528437, 10.727387902), (18.71030857, 10.648366814), (18.692307692, 10.607697294)],
                knots=[0, 0, 0, 0, 1.472543308, 2.876219568, 4.221790263, 5.565193594, 6.249813518, 6.953379497, 7.687249741, 8.463570142, 9.283606569, 10.136032583, 11.040678096, 12, 12, 12, 12], degree=3))
        make_face()
    extrude(amount=-CORTAR_EXTRUIR5_DEPTH, mode=Mode.SUBTRACT)

    # Croquis7 → Cortar-Extruir6 (cut, through all)
    with BuildSketch(Plane.ZY):
        with Locations((-26, 20)):
            Circle(CROQUIS7_R)
    extrude(amount=-CORTAR_EXTRUIR6_DEPTH, mode=Mode.SUBTRACT)


solid = part.part
